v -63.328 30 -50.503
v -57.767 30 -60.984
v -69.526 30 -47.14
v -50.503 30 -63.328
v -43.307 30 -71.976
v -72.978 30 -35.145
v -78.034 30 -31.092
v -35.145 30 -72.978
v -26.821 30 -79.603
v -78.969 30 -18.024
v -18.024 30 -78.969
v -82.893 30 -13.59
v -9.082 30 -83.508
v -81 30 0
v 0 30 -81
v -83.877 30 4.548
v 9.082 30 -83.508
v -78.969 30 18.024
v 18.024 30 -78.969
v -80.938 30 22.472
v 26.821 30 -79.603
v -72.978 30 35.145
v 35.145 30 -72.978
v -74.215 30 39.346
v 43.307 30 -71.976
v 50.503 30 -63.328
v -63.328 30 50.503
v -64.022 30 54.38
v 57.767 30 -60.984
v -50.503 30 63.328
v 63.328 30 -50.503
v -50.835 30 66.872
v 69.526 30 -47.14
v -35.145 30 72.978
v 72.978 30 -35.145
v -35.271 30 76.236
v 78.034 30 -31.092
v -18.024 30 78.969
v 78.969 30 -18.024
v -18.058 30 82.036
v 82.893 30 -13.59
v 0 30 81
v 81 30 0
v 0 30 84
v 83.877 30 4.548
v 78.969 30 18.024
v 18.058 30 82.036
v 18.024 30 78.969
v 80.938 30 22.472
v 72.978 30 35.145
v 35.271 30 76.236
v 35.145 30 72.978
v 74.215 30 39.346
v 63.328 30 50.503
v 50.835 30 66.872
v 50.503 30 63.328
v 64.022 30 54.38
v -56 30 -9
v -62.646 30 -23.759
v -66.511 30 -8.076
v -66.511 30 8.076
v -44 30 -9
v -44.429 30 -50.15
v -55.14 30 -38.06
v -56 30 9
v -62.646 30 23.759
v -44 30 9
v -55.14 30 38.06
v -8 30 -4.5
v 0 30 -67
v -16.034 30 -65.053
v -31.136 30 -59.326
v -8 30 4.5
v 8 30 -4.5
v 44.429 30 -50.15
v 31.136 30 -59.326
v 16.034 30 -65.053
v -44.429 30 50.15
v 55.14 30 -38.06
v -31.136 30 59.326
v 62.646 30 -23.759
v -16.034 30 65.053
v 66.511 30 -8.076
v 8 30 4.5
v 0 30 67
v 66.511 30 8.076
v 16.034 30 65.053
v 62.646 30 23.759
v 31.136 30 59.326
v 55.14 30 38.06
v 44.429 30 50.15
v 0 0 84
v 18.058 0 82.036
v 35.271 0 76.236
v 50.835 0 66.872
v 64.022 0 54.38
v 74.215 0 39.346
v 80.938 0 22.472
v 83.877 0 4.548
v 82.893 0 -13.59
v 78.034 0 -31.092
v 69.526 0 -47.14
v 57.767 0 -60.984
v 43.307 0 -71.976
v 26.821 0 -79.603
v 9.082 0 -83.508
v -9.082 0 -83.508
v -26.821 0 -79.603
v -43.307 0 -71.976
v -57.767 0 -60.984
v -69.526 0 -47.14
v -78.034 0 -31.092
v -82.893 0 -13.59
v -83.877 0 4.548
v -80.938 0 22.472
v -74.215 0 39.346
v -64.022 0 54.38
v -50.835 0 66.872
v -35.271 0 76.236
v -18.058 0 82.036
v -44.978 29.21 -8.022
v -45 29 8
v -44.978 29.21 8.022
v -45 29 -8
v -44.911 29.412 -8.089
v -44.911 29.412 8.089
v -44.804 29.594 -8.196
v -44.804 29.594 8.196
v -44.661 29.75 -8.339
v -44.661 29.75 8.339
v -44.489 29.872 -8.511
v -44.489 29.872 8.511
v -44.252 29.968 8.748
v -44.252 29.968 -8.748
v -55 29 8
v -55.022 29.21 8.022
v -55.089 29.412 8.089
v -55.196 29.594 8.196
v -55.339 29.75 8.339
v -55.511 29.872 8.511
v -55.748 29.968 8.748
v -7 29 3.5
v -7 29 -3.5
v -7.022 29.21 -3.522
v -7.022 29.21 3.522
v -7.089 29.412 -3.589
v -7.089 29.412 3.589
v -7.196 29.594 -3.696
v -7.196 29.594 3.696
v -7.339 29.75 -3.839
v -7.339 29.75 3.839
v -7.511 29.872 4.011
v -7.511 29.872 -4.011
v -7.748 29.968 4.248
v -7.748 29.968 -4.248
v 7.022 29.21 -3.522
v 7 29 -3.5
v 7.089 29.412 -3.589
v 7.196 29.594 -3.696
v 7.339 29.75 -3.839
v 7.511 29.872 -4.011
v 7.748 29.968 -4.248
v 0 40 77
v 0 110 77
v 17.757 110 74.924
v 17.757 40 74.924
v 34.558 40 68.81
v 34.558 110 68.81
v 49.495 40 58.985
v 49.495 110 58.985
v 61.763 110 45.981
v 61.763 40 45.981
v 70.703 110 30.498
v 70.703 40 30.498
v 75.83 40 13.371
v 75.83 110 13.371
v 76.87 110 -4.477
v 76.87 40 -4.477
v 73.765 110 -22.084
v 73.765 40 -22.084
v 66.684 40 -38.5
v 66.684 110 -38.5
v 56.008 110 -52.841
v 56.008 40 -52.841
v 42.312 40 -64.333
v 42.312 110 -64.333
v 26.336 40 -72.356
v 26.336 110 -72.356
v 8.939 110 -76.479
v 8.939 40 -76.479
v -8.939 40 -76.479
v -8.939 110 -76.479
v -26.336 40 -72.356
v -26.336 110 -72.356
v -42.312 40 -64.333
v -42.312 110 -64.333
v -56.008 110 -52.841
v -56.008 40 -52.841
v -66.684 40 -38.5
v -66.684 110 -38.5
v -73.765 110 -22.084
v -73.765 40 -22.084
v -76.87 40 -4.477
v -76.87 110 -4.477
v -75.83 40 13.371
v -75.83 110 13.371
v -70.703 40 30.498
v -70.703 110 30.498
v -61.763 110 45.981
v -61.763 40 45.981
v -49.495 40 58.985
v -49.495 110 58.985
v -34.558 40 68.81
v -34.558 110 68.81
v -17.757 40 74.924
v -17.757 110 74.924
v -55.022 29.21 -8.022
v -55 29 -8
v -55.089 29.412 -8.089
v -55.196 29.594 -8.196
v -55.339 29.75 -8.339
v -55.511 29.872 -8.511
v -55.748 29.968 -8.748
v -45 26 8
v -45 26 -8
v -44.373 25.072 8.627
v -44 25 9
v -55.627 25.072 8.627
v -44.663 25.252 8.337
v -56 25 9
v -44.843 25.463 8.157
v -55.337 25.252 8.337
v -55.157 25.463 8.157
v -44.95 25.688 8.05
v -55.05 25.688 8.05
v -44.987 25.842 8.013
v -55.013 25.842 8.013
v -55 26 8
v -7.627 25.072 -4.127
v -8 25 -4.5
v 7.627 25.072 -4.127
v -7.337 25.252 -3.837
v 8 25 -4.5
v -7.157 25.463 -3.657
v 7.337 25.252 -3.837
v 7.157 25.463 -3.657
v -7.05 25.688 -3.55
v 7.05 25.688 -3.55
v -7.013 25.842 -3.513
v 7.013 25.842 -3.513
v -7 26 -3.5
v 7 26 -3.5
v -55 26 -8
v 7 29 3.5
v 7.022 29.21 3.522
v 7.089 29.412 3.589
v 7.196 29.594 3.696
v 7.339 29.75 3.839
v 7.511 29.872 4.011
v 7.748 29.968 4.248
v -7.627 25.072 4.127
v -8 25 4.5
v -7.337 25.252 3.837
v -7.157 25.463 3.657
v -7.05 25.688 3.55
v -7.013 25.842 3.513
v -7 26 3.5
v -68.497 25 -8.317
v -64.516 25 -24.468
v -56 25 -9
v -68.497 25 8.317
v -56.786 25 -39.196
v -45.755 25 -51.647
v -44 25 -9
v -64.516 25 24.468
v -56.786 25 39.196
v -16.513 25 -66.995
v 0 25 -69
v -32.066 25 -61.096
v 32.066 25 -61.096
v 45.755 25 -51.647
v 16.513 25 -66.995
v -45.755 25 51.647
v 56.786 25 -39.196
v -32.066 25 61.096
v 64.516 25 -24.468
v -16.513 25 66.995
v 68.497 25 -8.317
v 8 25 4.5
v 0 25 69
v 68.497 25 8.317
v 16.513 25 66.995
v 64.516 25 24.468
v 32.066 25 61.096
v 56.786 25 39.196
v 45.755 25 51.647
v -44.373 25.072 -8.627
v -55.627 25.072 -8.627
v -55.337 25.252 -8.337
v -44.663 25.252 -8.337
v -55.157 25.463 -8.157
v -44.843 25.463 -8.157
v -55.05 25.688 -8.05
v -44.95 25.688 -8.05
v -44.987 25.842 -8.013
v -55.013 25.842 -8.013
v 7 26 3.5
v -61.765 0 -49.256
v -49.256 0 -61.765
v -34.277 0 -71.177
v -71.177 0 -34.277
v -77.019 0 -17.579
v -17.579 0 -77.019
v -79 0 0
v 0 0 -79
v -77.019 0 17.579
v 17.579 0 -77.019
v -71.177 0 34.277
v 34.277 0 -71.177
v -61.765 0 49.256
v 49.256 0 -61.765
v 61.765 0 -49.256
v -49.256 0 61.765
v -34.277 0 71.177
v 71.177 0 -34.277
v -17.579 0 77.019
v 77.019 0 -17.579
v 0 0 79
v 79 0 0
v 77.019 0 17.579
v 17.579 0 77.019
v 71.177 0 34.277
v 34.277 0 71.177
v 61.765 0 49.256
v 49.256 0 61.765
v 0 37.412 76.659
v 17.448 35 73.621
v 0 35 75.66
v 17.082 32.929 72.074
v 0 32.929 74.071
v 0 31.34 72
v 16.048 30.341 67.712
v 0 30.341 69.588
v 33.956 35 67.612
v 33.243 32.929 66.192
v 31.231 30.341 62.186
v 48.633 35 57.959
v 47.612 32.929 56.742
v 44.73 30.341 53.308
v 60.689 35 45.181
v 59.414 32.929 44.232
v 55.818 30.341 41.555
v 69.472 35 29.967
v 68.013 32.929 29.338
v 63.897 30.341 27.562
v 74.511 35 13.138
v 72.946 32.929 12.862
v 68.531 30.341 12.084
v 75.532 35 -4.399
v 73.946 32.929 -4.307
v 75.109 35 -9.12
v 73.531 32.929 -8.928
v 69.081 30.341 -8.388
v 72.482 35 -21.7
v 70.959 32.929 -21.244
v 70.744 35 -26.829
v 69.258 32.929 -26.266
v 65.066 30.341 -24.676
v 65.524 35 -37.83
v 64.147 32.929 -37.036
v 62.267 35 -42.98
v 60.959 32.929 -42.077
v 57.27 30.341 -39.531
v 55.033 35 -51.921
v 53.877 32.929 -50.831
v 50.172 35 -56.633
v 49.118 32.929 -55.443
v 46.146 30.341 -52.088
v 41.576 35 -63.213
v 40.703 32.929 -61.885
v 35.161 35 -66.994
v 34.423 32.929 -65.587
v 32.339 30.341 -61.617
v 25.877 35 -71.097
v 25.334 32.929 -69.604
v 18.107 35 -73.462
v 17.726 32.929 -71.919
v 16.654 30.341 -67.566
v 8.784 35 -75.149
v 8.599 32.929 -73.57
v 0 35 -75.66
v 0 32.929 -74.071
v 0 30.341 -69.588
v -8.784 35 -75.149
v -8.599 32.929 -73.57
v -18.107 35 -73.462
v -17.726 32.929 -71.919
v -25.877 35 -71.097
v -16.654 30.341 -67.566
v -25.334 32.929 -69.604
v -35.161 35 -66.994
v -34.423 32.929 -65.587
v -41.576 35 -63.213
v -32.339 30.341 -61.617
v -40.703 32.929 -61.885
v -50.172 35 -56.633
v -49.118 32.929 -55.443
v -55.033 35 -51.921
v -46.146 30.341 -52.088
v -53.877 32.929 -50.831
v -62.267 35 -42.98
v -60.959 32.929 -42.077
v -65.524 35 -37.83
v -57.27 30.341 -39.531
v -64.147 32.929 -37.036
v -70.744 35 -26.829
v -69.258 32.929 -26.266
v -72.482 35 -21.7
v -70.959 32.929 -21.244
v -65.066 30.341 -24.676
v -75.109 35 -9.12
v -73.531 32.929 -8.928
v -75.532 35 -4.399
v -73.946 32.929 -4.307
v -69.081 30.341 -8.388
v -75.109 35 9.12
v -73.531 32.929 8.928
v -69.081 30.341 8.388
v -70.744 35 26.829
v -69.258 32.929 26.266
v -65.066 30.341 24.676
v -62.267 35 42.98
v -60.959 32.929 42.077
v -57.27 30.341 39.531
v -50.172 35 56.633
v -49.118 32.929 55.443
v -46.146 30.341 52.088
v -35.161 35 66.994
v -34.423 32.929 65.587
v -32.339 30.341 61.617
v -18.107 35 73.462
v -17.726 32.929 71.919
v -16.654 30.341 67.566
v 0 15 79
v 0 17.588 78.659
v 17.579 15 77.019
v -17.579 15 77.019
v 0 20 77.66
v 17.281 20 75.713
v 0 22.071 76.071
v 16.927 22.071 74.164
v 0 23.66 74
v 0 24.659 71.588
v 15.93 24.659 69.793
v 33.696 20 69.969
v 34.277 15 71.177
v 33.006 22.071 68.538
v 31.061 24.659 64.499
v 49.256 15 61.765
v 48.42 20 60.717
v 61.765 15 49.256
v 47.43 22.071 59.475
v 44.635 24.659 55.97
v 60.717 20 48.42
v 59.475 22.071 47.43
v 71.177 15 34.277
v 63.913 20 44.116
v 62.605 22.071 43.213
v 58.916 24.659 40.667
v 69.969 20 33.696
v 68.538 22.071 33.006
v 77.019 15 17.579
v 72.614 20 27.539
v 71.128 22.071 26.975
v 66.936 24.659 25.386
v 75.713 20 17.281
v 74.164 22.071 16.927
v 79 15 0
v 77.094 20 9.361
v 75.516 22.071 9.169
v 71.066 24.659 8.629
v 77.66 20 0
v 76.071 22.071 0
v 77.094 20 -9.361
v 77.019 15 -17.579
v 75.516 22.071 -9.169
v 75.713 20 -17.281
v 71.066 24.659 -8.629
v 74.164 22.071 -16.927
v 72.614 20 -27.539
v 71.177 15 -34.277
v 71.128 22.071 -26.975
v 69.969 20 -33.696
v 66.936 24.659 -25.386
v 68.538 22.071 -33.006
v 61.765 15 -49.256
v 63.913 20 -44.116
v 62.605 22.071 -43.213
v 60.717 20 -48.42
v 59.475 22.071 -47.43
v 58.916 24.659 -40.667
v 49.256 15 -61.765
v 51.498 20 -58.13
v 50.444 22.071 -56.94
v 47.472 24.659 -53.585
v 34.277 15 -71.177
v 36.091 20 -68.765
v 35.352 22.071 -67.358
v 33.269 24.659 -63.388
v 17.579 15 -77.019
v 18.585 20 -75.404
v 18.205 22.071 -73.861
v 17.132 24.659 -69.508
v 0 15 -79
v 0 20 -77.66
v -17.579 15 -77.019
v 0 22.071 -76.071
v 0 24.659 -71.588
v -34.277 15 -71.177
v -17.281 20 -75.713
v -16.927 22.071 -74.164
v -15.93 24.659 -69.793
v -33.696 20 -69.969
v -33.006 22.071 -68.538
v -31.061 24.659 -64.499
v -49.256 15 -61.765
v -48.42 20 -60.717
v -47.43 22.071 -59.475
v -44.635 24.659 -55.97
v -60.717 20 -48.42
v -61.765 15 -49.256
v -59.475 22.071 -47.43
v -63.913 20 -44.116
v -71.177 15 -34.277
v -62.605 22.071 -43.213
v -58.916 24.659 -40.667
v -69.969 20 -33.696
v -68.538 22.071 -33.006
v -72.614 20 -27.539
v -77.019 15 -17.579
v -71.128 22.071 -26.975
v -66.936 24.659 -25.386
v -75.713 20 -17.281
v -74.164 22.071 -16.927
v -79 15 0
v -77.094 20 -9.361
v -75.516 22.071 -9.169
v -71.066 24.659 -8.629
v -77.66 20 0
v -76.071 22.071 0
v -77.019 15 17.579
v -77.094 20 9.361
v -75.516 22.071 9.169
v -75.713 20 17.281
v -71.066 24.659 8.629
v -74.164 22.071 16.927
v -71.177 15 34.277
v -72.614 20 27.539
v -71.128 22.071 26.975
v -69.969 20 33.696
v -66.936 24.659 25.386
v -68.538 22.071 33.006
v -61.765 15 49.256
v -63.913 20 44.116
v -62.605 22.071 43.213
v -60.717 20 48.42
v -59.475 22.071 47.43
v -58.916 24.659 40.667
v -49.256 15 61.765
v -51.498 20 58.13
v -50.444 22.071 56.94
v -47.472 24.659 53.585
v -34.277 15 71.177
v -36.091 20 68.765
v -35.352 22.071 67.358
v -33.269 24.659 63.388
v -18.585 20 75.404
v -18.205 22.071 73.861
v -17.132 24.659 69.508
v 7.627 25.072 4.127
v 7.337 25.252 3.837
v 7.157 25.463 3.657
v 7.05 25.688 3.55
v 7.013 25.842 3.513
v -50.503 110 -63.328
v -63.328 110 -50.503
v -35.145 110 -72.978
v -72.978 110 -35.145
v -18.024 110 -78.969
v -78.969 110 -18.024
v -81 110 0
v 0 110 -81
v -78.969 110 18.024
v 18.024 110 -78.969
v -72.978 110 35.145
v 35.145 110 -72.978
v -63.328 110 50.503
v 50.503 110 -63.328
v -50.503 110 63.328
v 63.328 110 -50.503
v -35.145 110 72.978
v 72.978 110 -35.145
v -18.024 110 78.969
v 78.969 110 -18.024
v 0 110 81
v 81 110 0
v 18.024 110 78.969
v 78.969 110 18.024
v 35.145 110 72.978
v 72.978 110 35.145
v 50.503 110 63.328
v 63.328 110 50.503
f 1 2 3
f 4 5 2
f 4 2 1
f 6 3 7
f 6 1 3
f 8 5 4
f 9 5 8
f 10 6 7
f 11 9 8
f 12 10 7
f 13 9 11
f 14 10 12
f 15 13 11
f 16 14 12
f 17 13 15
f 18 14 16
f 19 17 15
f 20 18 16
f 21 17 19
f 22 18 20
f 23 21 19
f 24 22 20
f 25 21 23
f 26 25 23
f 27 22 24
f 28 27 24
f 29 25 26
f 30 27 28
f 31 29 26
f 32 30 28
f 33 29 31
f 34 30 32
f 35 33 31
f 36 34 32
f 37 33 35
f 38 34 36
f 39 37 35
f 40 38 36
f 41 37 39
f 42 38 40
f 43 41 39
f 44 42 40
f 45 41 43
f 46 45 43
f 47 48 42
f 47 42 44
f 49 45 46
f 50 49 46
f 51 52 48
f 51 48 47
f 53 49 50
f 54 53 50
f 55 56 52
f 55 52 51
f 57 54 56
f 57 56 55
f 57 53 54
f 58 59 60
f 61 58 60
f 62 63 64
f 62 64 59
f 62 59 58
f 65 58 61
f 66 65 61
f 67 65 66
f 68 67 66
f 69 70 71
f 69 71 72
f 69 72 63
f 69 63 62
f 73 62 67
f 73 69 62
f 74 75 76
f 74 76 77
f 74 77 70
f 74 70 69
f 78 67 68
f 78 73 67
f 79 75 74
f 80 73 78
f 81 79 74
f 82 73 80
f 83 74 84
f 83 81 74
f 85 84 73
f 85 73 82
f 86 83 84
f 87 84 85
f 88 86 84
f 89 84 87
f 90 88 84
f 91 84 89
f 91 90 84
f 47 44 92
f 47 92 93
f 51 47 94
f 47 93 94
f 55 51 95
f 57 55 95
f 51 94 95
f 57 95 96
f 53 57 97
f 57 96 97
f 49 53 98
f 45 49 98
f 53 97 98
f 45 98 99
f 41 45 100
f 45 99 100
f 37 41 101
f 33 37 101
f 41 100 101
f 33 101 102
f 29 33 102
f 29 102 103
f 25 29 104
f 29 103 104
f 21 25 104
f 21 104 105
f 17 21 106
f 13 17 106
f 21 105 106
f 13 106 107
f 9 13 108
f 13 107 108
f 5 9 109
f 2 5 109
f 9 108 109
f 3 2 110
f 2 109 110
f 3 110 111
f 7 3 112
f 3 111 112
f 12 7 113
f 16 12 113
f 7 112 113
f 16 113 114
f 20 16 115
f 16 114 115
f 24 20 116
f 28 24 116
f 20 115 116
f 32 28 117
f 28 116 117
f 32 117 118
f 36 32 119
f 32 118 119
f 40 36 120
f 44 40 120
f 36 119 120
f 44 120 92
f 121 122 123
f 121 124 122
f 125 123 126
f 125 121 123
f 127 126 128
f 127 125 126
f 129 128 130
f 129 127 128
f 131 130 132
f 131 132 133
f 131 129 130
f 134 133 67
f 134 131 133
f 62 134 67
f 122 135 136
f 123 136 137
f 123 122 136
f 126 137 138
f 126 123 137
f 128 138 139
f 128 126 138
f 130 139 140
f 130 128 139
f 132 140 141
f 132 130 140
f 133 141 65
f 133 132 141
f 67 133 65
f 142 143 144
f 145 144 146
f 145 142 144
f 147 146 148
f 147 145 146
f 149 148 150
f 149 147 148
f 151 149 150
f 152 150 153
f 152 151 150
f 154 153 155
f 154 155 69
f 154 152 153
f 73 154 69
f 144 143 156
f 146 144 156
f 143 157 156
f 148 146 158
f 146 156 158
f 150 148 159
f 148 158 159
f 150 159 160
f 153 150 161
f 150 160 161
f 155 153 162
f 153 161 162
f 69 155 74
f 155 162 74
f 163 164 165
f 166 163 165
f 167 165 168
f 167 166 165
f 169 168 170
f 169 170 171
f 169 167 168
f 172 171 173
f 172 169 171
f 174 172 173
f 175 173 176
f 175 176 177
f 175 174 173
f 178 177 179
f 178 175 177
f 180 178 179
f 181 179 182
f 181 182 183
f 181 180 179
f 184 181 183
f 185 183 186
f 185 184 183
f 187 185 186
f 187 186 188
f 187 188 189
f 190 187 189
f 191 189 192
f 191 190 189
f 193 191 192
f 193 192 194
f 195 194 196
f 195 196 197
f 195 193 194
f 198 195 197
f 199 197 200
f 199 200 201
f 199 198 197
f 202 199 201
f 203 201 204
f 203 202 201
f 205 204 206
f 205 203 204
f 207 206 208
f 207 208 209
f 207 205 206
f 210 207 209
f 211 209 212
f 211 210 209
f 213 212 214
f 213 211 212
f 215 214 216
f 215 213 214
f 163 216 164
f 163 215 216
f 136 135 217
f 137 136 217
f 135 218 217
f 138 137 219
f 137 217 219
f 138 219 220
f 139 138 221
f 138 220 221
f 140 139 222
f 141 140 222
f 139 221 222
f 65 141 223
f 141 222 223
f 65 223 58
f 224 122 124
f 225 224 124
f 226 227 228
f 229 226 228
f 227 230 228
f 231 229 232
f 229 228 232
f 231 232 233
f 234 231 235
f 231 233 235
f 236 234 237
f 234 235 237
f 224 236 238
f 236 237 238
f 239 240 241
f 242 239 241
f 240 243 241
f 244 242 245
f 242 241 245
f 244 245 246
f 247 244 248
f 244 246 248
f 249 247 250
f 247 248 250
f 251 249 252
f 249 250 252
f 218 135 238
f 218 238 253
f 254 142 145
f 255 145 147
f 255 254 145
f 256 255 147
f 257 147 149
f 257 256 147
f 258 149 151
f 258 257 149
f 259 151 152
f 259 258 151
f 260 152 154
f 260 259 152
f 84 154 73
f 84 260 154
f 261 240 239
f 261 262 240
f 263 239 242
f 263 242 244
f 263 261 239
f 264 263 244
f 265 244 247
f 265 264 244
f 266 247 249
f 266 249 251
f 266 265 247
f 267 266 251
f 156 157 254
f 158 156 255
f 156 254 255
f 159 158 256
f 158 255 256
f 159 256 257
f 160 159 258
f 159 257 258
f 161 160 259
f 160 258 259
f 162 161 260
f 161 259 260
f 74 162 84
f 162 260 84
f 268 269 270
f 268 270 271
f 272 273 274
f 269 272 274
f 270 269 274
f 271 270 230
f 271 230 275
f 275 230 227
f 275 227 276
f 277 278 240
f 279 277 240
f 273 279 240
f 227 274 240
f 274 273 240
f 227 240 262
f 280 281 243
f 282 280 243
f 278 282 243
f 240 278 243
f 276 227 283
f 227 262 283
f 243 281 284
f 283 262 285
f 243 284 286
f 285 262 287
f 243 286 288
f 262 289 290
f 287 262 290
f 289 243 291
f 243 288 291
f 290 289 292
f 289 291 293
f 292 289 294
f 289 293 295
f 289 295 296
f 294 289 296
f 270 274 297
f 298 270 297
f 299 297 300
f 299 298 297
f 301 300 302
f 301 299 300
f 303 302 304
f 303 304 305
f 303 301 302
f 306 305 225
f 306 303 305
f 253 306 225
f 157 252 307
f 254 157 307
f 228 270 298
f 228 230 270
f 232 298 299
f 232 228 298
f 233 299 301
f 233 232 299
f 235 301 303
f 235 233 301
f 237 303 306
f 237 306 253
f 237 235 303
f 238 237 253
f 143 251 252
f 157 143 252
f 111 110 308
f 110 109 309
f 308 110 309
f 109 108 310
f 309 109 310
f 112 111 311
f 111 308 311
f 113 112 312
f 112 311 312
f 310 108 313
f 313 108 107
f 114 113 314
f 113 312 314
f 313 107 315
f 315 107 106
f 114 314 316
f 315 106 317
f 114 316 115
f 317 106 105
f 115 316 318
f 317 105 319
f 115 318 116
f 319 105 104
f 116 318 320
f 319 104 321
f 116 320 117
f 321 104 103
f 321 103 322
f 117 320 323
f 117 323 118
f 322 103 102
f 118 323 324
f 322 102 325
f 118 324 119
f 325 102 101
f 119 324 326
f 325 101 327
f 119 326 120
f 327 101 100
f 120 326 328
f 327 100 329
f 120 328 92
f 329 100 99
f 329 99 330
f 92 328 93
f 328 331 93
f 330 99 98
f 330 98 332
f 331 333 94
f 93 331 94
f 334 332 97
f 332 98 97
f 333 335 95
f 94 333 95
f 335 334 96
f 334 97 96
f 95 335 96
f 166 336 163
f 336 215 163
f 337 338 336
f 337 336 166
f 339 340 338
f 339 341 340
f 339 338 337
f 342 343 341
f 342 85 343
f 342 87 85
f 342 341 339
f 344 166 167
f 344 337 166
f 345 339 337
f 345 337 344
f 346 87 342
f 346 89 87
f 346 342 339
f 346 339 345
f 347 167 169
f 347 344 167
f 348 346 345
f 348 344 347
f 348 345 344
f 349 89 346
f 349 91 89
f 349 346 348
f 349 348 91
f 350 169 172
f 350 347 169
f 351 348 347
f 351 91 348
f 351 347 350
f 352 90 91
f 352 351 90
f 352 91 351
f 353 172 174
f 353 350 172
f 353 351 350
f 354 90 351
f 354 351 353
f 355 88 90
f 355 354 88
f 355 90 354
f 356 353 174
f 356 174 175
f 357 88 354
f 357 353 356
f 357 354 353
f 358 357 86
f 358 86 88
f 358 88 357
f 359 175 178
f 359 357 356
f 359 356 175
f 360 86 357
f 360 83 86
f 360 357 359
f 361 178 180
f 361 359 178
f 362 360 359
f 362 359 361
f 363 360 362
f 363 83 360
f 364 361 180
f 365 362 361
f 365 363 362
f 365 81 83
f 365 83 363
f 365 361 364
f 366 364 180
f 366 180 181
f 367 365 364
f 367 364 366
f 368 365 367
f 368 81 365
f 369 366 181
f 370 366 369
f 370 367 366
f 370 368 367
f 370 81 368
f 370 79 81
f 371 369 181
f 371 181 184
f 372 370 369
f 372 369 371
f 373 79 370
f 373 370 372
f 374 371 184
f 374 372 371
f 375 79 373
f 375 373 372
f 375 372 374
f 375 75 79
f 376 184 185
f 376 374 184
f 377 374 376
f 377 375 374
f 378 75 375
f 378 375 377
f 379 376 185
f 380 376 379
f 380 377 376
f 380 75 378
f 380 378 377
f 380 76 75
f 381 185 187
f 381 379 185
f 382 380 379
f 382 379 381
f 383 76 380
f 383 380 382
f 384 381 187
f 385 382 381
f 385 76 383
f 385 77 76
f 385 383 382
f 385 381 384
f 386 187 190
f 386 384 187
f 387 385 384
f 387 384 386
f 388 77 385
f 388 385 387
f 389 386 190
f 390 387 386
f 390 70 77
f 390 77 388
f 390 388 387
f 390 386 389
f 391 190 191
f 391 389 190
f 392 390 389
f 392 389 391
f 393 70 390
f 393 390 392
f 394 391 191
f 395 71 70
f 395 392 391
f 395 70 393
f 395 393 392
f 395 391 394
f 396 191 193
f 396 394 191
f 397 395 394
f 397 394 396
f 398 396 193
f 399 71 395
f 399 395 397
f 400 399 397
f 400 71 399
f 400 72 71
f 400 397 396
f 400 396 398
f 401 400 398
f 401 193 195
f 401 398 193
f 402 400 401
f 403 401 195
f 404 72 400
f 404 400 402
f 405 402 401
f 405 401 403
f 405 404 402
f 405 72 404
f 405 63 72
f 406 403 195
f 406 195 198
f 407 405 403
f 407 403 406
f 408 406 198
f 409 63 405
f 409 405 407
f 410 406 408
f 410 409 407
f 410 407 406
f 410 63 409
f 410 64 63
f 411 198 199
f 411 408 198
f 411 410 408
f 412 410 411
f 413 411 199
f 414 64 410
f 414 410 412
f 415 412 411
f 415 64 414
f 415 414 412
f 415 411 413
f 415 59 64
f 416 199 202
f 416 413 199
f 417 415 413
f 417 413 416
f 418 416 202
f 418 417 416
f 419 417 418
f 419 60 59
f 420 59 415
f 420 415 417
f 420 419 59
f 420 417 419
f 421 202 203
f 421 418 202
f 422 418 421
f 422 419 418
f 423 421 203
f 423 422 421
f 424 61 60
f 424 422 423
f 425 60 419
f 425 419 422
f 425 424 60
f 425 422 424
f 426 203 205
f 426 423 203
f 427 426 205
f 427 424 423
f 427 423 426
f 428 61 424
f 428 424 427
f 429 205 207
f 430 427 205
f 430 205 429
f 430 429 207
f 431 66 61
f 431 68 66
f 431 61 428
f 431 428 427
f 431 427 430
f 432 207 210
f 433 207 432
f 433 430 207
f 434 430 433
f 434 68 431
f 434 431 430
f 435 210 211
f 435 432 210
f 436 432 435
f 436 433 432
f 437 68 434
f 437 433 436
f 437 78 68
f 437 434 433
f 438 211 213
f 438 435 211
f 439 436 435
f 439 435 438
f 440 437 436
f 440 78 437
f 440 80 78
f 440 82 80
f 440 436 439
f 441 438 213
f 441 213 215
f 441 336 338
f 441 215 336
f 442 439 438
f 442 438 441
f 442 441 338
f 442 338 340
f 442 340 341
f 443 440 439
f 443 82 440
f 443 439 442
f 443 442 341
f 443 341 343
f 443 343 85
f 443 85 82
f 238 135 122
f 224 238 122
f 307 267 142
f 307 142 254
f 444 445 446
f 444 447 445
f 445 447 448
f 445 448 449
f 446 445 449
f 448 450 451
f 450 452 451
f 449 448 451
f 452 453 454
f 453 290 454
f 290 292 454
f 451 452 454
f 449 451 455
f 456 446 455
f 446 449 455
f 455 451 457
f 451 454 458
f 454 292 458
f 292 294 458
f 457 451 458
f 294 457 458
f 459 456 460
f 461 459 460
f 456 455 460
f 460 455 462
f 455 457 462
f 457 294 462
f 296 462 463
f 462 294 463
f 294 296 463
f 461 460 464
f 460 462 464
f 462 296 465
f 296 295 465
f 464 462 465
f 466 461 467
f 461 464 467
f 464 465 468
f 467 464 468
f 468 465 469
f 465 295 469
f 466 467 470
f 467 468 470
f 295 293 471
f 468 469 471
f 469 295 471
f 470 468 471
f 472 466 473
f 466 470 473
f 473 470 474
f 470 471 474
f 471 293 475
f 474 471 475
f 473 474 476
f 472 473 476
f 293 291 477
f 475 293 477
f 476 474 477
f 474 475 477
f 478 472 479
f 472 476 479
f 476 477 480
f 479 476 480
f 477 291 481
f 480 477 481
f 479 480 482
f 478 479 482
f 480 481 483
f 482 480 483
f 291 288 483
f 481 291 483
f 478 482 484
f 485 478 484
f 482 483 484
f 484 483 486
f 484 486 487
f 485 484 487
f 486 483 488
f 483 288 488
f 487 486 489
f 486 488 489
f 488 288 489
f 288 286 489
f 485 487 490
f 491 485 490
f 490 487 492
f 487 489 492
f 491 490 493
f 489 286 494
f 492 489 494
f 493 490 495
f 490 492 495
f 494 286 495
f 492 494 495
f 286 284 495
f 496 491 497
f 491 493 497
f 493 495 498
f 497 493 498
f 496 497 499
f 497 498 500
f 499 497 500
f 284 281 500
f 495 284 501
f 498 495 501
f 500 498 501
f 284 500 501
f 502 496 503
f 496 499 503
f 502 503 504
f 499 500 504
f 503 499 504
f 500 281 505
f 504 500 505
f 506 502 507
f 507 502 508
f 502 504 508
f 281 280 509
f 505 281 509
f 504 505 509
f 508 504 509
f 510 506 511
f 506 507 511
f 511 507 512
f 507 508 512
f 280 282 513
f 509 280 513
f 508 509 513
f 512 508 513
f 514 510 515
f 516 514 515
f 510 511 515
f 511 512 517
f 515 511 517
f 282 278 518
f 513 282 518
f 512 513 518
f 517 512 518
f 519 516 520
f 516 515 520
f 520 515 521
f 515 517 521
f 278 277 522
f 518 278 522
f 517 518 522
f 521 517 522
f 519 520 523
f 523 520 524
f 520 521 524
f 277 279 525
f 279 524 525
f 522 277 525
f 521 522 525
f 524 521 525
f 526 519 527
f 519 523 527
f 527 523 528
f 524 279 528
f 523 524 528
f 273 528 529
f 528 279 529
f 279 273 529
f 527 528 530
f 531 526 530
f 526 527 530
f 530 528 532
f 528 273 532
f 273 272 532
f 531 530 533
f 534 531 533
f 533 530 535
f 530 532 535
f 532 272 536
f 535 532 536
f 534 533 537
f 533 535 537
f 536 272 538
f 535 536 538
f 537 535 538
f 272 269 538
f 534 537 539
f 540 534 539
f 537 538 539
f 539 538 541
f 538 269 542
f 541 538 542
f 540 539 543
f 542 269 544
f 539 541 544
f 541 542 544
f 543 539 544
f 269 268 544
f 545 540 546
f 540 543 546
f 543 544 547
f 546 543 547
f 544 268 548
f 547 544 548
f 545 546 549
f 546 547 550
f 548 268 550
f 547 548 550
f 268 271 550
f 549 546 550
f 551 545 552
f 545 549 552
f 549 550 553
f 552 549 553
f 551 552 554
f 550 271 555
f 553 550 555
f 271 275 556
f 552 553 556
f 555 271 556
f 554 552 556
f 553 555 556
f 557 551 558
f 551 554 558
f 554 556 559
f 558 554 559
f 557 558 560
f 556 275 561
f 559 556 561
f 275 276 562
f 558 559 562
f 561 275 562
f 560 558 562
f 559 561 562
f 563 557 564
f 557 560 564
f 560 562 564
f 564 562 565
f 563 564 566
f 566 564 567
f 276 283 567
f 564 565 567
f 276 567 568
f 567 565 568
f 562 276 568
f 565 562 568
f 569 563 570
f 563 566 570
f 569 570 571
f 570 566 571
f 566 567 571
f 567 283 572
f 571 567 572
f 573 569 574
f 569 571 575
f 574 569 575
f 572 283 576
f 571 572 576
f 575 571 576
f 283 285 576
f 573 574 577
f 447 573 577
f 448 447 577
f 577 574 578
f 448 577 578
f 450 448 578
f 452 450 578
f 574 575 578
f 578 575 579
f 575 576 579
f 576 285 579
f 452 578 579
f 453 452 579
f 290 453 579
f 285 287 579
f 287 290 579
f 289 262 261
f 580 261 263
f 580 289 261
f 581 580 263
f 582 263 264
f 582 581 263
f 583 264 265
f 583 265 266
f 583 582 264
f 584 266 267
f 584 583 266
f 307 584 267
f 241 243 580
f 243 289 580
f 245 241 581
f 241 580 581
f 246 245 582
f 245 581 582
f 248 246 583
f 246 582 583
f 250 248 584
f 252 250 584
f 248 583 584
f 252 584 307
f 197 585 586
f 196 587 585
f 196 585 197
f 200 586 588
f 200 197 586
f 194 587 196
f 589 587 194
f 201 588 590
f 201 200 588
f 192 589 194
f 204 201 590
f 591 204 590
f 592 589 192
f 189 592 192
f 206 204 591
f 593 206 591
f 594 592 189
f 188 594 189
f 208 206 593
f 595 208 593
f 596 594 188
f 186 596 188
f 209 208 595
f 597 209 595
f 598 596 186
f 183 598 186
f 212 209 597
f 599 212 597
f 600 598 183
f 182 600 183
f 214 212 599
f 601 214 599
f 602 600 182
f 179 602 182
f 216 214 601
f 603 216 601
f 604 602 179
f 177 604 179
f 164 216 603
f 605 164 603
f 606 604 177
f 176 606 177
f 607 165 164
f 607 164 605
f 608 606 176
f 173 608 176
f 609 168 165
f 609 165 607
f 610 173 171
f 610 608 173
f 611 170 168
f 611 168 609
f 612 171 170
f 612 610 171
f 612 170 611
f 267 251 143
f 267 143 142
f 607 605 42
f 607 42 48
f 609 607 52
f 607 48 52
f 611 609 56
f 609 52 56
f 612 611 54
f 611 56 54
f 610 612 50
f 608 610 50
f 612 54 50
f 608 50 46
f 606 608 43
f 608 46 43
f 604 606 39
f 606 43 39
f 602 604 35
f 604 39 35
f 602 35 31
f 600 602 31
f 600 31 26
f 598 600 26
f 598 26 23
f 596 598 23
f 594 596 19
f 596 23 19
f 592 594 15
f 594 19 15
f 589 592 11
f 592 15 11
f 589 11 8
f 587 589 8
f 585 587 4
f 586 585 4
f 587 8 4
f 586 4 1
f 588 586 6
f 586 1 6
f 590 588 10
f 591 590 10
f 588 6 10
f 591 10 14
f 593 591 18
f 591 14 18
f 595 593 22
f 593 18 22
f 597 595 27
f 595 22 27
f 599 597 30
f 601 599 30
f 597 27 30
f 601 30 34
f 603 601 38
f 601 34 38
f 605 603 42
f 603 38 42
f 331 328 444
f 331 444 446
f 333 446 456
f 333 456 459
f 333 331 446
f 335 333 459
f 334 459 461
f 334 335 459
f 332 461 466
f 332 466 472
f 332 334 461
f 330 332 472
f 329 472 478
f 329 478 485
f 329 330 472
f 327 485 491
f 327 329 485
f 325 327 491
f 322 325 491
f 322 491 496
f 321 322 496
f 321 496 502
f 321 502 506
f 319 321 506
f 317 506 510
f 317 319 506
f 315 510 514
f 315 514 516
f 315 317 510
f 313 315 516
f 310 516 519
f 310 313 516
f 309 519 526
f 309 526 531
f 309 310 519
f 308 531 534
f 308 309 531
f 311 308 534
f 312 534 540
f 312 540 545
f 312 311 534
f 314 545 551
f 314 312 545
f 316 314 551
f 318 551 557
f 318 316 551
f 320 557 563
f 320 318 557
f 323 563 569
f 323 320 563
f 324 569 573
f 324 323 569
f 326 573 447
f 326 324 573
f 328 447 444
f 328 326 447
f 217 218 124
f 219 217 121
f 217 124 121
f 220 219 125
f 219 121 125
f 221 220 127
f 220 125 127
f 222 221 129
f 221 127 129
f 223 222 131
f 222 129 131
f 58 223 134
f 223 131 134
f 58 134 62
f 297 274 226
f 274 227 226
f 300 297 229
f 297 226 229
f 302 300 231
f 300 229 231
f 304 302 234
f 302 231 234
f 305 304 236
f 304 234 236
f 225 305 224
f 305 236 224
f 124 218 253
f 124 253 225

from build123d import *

# Parameters (mm, degrees)
SKETCH1_R           = 84
SKETCH1_R_2         = 79
BOSS_EXTRUDE1_DEPTH = 25
SKETCH2_R           = 84
BOSS_EXTRUDE2_DEPTH = 5
SKETCH3_R           = 81
SKETCH3_R_2         = 77
BOSS_EXTRUDE3_DEPTH = 80
FILLET1_R           = 10
CUT_EXTRUDE1_REACH  = 148.072
SKETCH4_W           = 14
SKETCH4_H           = 7
CUT_EXTRUDE2_REACH  = 145.22
SKETCH5_W           = 10
SKETCH5_H           = 16
FILLET2_R           = 1


with BuildPart() as part:
    # Sketch1 → Boss-Extrude1 (new body)
    with BuildSketch(Plane(origin=(0, 0, 0), x_dir=(1, 0, 0), z_dir=(0, 1, 0))):
        with Locations(Location((0, 0, 0), (0, 0, 270))):
            Circle(SKETCH1_R)
        with Locations(Location((0, 0, 0), (0, 0, 270))):
            Circle(SKETCH1_R_2, mode=Mode.SUBTRACT)
    extrude(amount=BOSS_EXTRUDE1_DEPTH)

    # Sketch2 → Boss-Extrude2 (add)
    with BuildSketch(Plane(origin=(0, 25, 0), x_dir=(1, 0, 0), z_dir=(0, 1, 0))):
        with Locations(Location((0, 0, 0), (0, 0, 270))):
            Circle(SKETCH2_R)
    extrude(amount=BOSS_EXTRUDE2_DEPTH)

    # Sketch3 → Boss-Extrude3 (add)
    with BuildSketch(Plane(origin=(0, 30, 0), x_dir=(1, 0, 0), z_dir=(0, 1, 0))):
        with Locations(Location((0, 0, 0), (0, 0, 270))):
            Circle(SKETCH3_R)
        with Locations(Location((0, 0, 0), (0, 0, 270))):
            Circle(SKETCH3_R_2, mode=Mode.SUBTRACT)
    extrude(amount=BOSS_EXTRUDE3_DEPTH)

    # Fillet1
    fillet1_edges = [part.edges().sort_by_distance(p)[0] for p in [
        (0, 25, -79),
        (0, 30, -77),
    ]]
    fillet(fillet1_edges, radius=FILLET1_R)

    # Sketch4 → Cut-Extrude1 (cut, up to next)
    with BuildSketch(Plane.XZ.offset(-25), mode=Mode.PRIVATE) as cut_extrude1_sk1:
        Rectangle(SKETCH4_W, SKETCH4_H)
    cut_extrude1_tool1 = extrude(cut_extrude1_sk1.sketch, amount=-CUT_EXTRUDE1_REACH, mode=Mode.PRIVATE) & part.part
    add(cut_extrude1_tool1.solids().sort_by_distance((0, 25, 0))[0], mode=Mode.SUBTRACT)

    # Sketch5 → Cut-Extrude2 (cut, up to next)
    with BuildSketch(Plane(origin=(0, 30, 0), x_dir=(1, 0, 0), z_dir=(0, 1, 0)), mode=Mode.PRIVATE) as cut_extrude2_sk1:
        with Locations((-50, 0)):
            Rectangle(SKETCH5_W, SKETCH5_H)
    cut_extrude2_tool1 = extrude(cut_extrude2_sk1.sketch, amount=-CUT_EXTRUDE2_REACH, mode=Mode.PRIVATE) & part.part
    add(cut_extrude2_tool1.solids().sort_by_distance((-50, 30, 0))[0], mode=Mode.SUBTRACT)

    # Fillet2
    fillet2_edges = [part.edges().sort_by_distance(p)[0] for p in [
        (0, 30, 3.5),
        (7, 30, 0),
        (0, 30, -3.5),
        (-7, 30, 0),
        (0, 25, 3.5),
        (-7, 25, 0),
        (0, 25, -3.5),
        (7, 25, 0),
        (-55, 30, 0),
        (-50, 30, 8),
        (-45, 30, 0),
        (-50, 30, -8),
        (-50, 25, 8),
        (-55, 25, 0),
        (-50, 25, -8),
        (-45, 25, 0),
    ]]
    fillet(fillet2_edges, radius=FILLET2_R)


solid = part.part
